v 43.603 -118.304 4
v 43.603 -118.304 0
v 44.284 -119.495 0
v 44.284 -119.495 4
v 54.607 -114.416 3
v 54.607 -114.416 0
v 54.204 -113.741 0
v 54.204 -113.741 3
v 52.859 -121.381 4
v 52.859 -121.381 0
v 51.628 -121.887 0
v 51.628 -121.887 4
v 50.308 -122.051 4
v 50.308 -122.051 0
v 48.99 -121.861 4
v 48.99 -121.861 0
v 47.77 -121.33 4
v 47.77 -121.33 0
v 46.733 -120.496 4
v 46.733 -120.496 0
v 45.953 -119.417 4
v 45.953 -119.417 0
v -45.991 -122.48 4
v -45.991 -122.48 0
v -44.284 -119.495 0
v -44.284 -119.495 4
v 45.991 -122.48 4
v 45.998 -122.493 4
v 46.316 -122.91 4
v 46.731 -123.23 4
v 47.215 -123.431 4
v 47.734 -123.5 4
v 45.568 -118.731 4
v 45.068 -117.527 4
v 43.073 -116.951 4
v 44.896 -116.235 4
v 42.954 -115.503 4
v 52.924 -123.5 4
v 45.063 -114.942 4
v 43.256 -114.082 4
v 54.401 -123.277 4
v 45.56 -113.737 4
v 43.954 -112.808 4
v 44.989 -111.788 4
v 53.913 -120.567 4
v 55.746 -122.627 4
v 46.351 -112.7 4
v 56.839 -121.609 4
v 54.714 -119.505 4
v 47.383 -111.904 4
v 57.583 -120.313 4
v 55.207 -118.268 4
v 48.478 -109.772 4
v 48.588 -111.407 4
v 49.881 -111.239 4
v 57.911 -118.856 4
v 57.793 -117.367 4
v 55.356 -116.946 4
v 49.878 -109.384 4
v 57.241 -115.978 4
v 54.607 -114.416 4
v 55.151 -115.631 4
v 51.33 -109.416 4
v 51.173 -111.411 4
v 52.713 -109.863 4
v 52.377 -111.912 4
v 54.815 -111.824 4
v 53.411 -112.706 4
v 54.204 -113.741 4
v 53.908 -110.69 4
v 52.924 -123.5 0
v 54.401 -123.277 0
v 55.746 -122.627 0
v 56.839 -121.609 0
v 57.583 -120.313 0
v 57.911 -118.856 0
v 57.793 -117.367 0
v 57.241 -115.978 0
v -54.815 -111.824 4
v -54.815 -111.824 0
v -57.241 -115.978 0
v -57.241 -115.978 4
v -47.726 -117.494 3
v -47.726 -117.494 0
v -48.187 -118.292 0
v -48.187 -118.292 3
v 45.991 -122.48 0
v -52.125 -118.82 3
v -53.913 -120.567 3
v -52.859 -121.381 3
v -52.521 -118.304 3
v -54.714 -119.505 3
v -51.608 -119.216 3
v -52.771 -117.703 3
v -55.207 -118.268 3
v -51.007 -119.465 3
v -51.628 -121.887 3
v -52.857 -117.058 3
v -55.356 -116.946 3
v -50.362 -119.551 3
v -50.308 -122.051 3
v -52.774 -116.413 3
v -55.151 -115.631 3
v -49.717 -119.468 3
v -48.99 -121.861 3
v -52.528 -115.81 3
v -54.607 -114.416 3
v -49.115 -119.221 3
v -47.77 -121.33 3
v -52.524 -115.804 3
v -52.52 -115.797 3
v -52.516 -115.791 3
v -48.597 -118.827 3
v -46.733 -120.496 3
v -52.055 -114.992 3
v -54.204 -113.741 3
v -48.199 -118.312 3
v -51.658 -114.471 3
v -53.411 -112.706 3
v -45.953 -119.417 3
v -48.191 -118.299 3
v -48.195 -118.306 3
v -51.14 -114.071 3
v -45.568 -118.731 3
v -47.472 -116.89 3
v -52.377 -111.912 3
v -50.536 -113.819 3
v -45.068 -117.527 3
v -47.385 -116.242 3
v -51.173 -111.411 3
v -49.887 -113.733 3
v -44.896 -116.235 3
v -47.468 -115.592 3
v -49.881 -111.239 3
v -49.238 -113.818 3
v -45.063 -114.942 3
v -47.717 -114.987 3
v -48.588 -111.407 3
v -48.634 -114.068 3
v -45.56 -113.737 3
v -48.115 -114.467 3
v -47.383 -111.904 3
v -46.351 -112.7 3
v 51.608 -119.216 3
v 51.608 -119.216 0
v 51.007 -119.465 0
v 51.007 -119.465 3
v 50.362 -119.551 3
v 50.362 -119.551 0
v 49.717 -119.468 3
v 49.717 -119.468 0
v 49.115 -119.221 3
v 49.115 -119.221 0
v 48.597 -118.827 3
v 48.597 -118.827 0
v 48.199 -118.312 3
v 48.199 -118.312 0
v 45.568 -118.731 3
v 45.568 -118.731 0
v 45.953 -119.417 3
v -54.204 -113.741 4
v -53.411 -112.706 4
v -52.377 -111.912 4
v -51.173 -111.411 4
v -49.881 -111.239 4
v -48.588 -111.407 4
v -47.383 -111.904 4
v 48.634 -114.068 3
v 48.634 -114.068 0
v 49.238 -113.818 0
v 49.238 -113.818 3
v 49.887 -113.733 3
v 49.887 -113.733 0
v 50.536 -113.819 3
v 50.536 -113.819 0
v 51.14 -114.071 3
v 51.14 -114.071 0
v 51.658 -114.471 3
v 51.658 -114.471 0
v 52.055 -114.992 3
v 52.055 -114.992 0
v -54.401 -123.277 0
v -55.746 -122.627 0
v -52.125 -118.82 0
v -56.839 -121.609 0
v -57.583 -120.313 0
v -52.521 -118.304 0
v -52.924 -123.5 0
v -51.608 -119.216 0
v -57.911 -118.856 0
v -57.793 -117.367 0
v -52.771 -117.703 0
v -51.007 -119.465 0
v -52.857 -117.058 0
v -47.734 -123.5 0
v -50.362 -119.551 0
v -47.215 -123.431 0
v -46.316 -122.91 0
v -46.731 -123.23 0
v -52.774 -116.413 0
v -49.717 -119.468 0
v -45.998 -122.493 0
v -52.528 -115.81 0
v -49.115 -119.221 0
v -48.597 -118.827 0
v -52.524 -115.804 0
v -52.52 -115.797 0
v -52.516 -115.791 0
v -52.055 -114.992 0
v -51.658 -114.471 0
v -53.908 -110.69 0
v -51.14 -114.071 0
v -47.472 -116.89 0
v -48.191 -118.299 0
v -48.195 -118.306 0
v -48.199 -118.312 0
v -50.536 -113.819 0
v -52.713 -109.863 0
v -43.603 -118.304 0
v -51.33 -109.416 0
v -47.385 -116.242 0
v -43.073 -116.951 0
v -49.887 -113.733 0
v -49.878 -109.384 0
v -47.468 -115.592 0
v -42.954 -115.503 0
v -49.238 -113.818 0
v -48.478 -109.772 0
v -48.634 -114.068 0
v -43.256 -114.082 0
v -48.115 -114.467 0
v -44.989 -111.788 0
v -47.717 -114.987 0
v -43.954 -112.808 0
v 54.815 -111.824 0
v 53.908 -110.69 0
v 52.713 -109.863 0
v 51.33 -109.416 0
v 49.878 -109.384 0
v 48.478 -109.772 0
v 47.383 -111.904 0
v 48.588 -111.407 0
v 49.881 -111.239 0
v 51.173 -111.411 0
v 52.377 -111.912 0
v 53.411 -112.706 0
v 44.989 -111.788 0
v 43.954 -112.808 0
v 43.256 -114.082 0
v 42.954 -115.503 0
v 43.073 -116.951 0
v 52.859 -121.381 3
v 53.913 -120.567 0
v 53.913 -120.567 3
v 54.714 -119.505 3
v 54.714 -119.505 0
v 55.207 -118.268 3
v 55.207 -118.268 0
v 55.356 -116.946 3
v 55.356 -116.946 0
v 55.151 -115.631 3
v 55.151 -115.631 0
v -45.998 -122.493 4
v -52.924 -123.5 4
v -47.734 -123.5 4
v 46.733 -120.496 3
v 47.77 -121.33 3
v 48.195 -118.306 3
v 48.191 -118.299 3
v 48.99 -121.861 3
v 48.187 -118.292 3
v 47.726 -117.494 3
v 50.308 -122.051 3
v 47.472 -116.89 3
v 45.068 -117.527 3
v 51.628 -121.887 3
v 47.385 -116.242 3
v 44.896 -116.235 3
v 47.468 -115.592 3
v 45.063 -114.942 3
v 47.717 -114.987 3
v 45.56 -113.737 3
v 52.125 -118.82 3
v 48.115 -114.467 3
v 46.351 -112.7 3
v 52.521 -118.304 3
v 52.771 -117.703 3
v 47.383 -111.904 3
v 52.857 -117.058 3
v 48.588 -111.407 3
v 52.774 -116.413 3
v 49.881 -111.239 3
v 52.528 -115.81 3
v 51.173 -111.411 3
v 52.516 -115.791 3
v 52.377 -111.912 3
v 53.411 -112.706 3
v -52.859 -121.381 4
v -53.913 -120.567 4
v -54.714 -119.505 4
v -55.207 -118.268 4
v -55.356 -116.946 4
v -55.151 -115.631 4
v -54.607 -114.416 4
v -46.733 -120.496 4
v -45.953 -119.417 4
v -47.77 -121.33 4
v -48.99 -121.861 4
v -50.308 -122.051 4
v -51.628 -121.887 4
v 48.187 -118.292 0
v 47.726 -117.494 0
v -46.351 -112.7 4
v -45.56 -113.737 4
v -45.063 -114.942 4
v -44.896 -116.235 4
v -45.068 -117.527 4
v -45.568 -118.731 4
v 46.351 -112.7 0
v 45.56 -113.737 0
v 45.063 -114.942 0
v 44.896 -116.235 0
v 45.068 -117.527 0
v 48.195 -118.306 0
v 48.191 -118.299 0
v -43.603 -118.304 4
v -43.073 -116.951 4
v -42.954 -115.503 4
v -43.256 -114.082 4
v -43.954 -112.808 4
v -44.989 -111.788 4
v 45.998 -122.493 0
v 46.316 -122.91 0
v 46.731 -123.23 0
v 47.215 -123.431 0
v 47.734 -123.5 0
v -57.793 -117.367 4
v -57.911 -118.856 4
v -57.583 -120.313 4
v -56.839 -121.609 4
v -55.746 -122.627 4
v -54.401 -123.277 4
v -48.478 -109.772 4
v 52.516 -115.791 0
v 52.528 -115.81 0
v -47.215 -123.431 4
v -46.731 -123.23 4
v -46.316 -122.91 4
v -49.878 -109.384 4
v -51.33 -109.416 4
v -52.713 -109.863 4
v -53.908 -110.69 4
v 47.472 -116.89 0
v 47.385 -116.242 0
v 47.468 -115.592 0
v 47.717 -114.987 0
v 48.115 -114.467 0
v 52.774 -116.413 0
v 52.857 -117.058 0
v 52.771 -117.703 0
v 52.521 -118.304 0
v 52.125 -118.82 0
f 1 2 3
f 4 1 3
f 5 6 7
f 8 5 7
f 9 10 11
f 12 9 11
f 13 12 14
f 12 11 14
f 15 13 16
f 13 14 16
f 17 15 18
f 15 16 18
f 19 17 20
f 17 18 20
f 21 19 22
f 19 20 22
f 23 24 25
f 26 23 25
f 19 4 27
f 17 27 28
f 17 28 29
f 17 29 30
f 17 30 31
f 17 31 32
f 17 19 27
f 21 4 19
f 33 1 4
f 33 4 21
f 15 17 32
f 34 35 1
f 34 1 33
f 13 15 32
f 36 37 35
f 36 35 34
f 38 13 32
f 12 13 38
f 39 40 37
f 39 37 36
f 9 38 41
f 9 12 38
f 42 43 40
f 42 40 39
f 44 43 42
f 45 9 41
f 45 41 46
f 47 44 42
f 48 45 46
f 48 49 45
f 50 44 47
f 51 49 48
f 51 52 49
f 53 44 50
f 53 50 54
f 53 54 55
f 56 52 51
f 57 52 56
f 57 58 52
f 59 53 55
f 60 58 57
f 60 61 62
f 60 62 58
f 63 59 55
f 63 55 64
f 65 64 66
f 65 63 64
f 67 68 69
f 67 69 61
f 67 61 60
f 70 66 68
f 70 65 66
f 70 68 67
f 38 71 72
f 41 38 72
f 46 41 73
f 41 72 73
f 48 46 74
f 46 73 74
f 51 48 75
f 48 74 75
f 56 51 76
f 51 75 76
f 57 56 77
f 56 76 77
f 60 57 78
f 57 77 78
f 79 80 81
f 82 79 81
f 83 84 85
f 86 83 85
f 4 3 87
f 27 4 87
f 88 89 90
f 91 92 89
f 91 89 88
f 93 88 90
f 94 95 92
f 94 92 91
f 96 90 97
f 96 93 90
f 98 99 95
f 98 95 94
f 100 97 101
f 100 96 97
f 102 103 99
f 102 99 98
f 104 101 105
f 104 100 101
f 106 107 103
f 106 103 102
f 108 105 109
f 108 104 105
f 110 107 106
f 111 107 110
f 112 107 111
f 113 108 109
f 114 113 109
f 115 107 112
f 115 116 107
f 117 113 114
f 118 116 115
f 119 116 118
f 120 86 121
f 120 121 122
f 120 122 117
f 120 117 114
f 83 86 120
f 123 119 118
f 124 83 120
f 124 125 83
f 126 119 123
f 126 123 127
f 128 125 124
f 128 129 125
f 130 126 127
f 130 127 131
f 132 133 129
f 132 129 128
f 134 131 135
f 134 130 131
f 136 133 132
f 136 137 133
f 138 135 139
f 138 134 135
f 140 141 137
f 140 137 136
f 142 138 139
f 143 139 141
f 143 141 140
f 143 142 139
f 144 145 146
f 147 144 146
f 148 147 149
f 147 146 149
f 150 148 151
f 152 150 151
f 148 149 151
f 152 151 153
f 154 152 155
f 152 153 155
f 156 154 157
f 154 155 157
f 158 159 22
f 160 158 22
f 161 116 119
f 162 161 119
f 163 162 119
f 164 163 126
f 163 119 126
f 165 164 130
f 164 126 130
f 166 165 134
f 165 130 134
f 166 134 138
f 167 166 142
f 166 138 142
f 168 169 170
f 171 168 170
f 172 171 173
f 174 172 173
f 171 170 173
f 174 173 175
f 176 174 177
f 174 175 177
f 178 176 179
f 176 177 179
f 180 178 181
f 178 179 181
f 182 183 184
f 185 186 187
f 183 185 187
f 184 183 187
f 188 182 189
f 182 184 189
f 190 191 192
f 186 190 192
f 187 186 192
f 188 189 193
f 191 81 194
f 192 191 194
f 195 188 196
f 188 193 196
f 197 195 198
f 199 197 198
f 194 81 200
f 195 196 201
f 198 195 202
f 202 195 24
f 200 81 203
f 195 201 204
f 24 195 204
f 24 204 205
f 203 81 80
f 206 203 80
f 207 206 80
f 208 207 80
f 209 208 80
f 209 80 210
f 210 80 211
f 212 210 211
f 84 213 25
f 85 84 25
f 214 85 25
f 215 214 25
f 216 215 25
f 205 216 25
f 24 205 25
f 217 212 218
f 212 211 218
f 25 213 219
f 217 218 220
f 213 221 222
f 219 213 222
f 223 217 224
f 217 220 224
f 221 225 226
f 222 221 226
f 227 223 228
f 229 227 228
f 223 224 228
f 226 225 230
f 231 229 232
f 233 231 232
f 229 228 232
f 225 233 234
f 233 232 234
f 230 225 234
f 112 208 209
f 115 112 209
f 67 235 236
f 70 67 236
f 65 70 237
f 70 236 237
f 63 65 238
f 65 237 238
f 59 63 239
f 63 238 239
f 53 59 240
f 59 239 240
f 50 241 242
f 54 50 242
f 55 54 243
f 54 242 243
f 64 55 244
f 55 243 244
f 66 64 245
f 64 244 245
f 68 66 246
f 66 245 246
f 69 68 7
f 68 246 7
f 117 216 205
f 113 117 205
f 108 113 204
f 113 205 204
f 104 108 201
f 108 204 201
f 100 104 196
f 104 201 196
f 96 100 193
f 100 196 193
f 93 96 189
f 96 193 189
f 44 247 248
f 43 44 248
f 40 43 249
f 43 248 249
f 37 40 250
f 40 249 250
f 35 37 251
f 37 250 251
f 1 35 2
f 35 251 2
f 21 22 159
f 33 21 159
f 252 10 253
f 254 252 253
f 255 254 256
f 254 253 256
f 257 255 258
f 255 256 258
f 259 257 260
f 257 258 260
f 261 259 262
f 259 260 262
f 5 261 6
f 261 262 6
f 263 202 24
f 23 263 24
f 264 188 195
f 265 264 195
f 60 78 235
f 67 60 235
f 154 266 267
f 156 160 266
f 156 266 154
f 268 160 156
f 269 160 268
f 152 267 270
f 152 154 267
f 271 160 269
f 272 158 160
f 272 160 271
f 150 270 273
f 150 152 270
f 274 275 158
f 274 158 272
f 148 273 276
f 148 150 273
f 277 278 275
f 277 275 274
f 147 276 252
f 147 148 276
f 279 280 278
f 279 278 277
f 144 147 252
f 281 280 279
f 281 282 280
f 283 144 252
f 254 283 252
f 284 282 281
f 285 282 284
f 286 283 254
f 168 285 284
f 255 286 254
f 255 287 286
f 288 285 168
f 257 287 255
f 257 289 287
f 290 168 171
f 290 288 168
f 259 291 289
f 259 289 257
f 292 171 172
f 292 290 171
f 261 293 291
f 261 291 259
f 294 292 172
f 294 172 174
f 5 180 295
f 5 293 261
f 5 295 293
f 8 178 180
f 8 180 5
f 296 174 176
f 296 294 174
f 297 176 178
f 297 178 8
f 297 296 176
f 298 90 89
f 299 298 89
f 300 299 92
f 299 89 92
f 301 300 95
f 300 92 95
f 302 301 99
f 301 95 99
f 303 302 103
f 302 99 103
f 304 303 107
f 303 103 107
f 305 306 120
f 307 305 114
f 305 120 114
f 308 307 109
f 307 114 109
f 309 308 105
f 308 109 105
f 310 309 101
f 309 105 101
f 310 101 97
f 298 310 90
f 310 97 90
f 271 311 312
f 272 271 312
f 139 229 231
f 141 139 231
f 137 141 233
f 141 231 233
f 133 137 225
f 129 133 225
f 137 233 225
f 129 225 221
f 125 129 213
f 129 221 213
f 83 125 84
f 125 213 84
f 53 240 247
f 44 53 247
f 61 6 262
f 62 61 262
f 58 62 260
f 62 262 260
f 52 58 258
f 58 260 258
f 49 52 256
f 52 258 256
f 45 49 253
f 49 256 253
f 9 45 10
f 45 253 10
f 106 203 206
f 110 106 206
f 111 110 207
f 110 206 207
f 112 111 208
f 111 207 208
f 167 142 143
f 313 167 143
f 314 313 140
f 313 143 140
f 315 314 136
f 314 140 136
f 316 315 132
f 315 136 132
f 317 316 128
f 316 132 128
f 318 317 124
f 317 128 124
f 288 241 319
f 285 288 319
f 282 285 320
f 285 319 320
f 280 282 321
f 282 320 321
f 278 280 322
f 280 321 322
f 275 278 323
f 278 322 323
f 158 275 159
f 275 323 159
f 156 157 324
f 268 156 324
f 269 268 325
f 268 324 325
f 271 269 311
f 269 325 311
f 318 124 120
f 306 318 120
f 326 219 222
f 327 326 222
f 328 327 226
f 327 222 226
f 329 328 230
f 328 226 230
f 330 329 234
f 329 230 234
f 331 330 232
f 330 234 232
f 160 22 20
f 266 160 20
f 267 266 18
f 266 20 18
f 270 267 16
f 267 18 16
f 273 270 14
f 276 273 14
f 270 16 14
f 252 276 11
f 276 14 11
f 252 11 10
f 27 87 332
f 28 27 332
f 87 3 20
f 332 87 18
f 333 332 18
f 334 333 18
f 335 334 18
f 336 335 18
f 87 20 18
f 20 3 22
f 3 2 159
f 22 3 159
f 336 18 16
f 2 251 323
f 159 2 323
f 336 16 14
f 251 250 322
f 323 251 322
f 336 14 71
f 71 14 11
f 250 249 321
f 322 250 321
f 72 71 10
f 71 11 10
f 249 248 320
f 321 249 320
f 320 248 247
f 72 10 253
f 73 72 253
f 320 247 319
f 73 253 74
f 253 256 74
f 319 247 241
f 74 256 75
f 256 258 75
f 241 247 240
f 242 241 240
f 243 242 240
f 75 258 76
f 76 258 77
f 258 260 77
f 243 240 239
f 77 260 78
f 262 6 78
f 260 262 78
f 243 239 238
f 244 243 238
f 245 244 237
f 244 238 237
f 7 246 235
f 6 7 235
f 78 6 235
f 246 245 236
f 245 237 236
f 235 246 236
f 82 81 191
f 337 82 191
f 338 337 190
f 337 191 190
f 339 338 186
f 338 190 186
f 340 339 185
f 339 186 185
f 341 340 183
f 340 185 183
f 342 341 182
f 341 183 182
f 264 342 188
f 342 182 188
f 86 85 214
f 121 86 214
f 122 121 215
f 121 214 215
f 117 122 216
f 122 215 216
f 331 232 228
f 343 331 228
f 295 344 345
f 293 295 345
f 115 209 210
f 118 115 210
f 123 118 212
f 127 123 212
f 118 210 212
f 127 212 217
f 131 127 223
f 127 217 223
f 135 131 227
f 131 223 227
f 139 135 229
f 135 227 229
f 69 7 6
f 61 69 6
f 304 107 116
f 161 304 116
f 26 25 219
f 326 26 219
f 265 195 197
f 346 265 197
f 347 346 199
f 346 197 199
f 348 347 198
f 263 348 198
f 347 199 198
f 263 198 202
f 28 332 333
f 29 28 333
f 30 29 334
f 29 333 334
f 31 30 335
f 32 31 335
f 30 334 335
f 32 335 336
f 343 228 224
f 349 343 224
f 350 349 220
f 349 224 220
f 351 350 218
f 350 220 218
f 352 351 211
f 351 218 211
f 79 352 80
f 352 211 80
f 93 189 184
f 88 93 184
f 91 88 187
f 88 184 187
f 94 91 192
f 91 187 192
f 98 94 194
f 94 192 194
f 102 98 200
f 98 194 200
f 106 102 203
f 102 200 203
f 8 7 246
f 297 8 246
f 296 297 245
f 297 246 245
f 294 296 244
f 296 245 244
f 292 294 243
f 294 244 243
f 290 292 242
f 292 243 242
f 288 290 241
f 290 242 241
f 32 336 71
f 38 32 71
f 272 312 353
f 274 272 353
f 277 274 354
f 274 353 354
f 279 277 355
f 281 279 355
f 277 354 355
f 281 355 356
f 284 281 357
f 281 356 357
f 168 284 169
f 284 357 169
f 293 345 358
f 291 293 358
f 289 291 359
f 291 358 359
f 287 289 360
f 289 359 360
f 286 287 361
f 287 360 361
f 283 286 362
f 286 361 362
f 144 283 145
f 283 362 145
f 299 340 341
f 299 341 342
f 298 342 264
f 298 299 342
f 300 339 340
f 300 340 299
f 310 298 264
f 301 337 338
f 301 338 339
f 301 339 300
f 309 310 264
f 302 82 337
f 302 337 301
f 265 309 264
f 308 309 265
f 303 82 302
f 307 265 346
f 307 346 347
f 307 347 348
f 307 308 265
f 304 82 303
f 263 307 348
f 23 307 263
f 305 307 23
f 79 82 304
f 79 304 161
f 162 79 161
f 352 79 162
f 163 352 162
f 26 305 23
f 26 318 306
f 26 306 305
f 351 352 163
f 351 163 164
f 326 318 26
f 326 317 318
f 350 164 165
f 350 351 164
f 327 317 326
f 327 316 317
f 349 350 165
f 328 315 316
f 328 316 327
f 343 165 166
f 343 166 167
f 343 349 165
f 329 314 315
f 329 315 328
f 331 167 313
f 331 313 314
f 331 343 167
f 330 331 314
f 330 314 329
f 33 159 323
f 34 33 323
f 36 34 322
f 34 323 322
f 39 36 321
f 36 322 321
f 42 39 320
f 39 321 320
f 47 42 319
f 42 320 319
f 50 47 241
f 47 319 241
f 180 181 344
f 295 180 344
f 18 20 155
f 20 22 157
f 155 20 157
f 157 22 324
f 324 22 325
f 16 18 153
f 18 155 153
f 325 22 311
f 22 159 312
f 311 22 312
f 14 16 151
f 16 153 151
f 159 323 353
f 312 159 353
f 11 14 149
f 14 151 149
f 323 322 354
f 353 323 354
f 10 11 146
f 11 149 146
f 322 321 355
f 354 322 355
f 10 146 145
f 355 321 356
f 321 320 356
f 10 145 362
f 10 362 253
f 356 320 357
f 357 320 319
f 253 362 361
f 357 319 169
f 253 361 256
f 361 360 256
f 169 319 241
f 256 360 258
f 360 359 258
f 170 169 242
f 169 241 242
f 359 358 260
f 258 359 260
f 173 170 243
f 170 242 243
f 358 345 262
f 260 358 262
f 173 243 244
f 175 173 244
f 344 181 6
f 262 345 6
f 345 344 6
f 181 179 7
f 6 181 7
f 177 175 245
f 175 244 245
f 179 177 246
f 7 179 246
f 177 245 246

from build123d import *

# Parameters (mm, degrees)
F1_DEPTH = 3
F2_DEPTH = 4


# Not quite as in the source:
# - a feature of the source that left no trace in its solid (it failed there, or was rolled back) is left out


with BuildPart() as f1:
    # F0 (on Top) → F1 (new body)
    with BuildSketch(Plane.XY):
        with BuildLine():
            Line((-45.9526433684, -119.4173828764), (-45.5681720757, -118.7312487792))
            ThreePointArc((-45.5681720757, -118.7312487792), (-45.063382941, -114.9422867004), (-47.382754767, -111.9039384587))
            ThreePointArc((-47.382754767, -111.9039384587), (-51.1733291767, -111.4114028263), (-54.204162304, -113.74058643))
            Line((-54.204162304, -113.74058643), (-54.606684435, -114.4162891074))
            ThreePointArc((-54.606684435, -114.4162891074), (-55.2070897412, -118.268307011), (-52.8591895991, -121.3805238068))
            ThreePointArc((-52.8591895991, -121.3805238068), (-48.9903690941, -121.8608948729), (-45.9526433684, -119.4173828764))
        make_face()
        with BuildLine():
            ThreePointArc((-48.1986328556, -118.3121961967), (-49.7169013888, -119.4679619999), (-51.608311622, -119.2159674351))
            ThreePointArc((-51.608311622, -119.2159674351), (-52.7710236039, -117.703011792), (-52.5277001335, -115.8104665166))
            ThreePointArc((-52.5277001335, -115.8104665166), (-52.5219900166, -115.8005330863), (-52.5162344341, -115.7906259301))
            Line((-52.5162344341, -115.7906259301), (-52.0547569365, -114.9920715737))
            ThreePointArc((-52.0547569365, -114.9920715737), (-50.5360911765, -113.8194261615), (-48.6336124708, -114.0684597488))
            ThreePointArc((-48.6336124708, -114.0684597488), (-47.4679395113, -115.5924838645), (-47.7256896586, -117.4938012538))
            Line((-47.7256896586, -117.4938012538), (-48.1871671562, -118.2923556102))
            ThreePointArc((-48.1871671562, -118.2923556102), (-48.1928772732, -118.3022890405), (-48.1986328556, -118.3121961967))
        make_face(mode=Mode.SUBTRACT)
    extrude(amount=F1_DEPTH)

    # F0 (on Top) → F2 (join)
    with BuildSketch(Plane.XY):
        with BuildLine():
            Line((-44.9889898264, -111.7881834274), (-48.4776615988, -109.7721108748))
            ThreePointArc((-48.4776615988, -109.7721108748), (-52.0379556259, -109.5891437921), (-54.8151657439, -111.8243785613))
            Line((-54.8151657439, -111.8243785613), (-57.2412191282, -115.9784297334))
            ThreePointArc((-57.2412191282, -115.9784297334), (-57.2599668976, -120.989191502), (-52.9236175497, -123.5))
            Line((-52.9236175497, -123.5), (-47.7342220294, -123.5))
            ThreePointArc((-47.7342220294, -123.5), (-46.7306063846, -123.2299582762), (-45.9980088385, -122.4927556374))
            Line((-45.9980088385, -122.4927556374), (-45.9907136957, -122.4799972882))
            Line((-45.9907136957, -122.4799972882), (-44.2837898974, -119.4947877334))
            Line((-44.2837898974, -119.4947877334), (-43.6028383647, -118.3038833569))
            ThreePointArc((-43.6028383647, -118.3038833569), (-43.0528160814, -114.7815764423), (-44.9889898264, -111.7881834274))
        make_face()
        with BuildLine():
            ThreePointArc((-47.382754767, -111.9039384587), (-45.063382941, -114.9422867004), (-45.5681720757, -118.7312487792))
            Line((-45.5681720757, -118.7312487792), (-45.9526433684, -119.4173828764))
            ThreePointArc((-45.9526433684, -119.4173828764), (-48.9903690941, -121.8608948729), (-52.8591895991, -121.3805238068))
            ThreePointArc((-52.8591895991, -121.3805238068), (-55.2070897412, -118.268307011), (-54.606684435, -114.4162891074))
            Line((-54.606684435, -114.4162891074), (-54.204162304, -113.74058643))
            ThreePointArc((-54.204162304, -113.74058643), (-51.1733291767, -111.4114028263), (-47.382754767, -111.9039384587))
        make_face(mode=Mode.SUBTRACT)
    extrude(amount=F2_DEPTH)


with BuildPart() as f1b:
    # F0 (on Top) → F1, piece 2 (new body)
    with BuildSketch(Plane.XY):
        with BuildLine():
            ThreePointArc((47.382754767, -111.9039384587), (45.063382941, -114.9422867004), (45.5681720757, -118.7312487792))
            Line((45.5681720757, -118.7312487792), (45.9526433684, -119.4173828764))
            ThreePointArc((45.9526433684, -119.4173828764), (48.9903690941, -121.8608948729), (52.8591895991, -121.3805238068))
            ThreePointArc((52.8591895991, -121.3805238068), (55.2070897412, -118.268307011), (54.606684435, -114.4162891074))
            Line((54.606684435, -114.4162891074), (54.204162304, -113.74058643))
            ThreePointArc((54.204162304, -113.74058643), (51.1733291767, -111.4114028263), (47.382754767, -111.9039384587))
        make_face()
        with BuildLine():
            ThreePointArc((48.6336124708, -114.0684597488), (50.5360911765, -113.8194261615), (52.0547569365, -114.9920715737))
            Line((52.0547569365, -114.9920715737), (52.5162344341, -115.7906259301))
            Line((52.5162344341, -115.7906259301), (52.5277001335, -115.8104665166))
            ThreePointArc((52.5277001335, -115.8104665166), (52.7710236039, -117.703011792), (51.608311622, -119.2159674351))
            ThreePointArc((51.608311622, -119.2159674351), (49.7169013888, -119.4679619999), (48.1986328556, -118.3121961967))
            ThreePointArc((48.1986328556, -118.3121961967), (48.1928772732, -118.3022890405), (48.1871671562, -118.2923556102))
            Line((48.1871671562, -118.2923556102), (47.7256896586, -117.4938012538))
            ThreePointArc((47.7256896586, -117.4938012538), (47.4679395113, -115.5924838645), (48.6336124708, -114.0684597488))
        make_face(mode=Mode.SUBTRACT)
    extrude(amount=F1_DEPTH)


with BuildPart() as f2:
    # F0 (on Top) → F2, piece 2 (new body)
    with BuildSketch(Plane.XY):
        with BuildLine():
            ThreePointArc((54.8151657439, -111.8243785613), (52.0379556259, -109.5891437921), (48.4776615988, -109.7721108748))
            Line((48.4776615988, -109.7721108748), (44.9889898264, -111.7881834274))
            ThreePointArc((44.9889898264, -111.7881834274), (43.0528160814, -114.7815764423), (43.6028383647, -118.3038833569))
            Line((43.6028383647, -118.3038833569), (44.2837898974, -119.4947877334))
            Line((44.2837898974, -119.4947877334), (45.9907136957, -122.4799972882))
            Line((45.9907136957, -122.4799972882), (45.9980088385, -122.4927556374))
            ThreePointArc((45.9980088385, -122.4927556374), (46.7306063846, -123.2299582762), (47.7342220294, -123.5))
            Line((47.7342220294, -123.5), (52.9236175497, -123.5))
            ThreePointArc((52.9236175497, -123.5), (57.2599668976, -120.989191502), (57.2412191282, -115.9784297334))
            Line((57.2412191282, -115.9784297334), (54.8151657439, -111.8243785613))
        make_face()
        with BuildLine():
            Line((45.9526433684, -119.4173828764), (45.5681720757, -118.7312487792))
            ThreePointArc((45.5681720757, -118.7312487792), (45.063382941, -114.9422867004), (47.382754767, -111.9039384587))
            ThreePointArc((47.382754767, -111.9039384587), (51.1733291767, -111.4114028263), (54.204162304, -113.74058643))
            Line((54.204162304, -113.74058643), (54.606684435, -114.4162891074))
            ThreePointArc((54.606684435, -114.4162891074), (55.2070897412, -118.268307011), (52.8591895991, -121.3805238068))
            ThreePointArc((52.8591895991, -121.3805238068), (48.9903690941, -121.8608948729), (45.9526433684, -119.4173828764))
        make_face(mode=Mode.SUBTRACT)
    extrude(amount=F2_DEPTH)


solid = Compound([f1.part, f1b.part, f2.part])
